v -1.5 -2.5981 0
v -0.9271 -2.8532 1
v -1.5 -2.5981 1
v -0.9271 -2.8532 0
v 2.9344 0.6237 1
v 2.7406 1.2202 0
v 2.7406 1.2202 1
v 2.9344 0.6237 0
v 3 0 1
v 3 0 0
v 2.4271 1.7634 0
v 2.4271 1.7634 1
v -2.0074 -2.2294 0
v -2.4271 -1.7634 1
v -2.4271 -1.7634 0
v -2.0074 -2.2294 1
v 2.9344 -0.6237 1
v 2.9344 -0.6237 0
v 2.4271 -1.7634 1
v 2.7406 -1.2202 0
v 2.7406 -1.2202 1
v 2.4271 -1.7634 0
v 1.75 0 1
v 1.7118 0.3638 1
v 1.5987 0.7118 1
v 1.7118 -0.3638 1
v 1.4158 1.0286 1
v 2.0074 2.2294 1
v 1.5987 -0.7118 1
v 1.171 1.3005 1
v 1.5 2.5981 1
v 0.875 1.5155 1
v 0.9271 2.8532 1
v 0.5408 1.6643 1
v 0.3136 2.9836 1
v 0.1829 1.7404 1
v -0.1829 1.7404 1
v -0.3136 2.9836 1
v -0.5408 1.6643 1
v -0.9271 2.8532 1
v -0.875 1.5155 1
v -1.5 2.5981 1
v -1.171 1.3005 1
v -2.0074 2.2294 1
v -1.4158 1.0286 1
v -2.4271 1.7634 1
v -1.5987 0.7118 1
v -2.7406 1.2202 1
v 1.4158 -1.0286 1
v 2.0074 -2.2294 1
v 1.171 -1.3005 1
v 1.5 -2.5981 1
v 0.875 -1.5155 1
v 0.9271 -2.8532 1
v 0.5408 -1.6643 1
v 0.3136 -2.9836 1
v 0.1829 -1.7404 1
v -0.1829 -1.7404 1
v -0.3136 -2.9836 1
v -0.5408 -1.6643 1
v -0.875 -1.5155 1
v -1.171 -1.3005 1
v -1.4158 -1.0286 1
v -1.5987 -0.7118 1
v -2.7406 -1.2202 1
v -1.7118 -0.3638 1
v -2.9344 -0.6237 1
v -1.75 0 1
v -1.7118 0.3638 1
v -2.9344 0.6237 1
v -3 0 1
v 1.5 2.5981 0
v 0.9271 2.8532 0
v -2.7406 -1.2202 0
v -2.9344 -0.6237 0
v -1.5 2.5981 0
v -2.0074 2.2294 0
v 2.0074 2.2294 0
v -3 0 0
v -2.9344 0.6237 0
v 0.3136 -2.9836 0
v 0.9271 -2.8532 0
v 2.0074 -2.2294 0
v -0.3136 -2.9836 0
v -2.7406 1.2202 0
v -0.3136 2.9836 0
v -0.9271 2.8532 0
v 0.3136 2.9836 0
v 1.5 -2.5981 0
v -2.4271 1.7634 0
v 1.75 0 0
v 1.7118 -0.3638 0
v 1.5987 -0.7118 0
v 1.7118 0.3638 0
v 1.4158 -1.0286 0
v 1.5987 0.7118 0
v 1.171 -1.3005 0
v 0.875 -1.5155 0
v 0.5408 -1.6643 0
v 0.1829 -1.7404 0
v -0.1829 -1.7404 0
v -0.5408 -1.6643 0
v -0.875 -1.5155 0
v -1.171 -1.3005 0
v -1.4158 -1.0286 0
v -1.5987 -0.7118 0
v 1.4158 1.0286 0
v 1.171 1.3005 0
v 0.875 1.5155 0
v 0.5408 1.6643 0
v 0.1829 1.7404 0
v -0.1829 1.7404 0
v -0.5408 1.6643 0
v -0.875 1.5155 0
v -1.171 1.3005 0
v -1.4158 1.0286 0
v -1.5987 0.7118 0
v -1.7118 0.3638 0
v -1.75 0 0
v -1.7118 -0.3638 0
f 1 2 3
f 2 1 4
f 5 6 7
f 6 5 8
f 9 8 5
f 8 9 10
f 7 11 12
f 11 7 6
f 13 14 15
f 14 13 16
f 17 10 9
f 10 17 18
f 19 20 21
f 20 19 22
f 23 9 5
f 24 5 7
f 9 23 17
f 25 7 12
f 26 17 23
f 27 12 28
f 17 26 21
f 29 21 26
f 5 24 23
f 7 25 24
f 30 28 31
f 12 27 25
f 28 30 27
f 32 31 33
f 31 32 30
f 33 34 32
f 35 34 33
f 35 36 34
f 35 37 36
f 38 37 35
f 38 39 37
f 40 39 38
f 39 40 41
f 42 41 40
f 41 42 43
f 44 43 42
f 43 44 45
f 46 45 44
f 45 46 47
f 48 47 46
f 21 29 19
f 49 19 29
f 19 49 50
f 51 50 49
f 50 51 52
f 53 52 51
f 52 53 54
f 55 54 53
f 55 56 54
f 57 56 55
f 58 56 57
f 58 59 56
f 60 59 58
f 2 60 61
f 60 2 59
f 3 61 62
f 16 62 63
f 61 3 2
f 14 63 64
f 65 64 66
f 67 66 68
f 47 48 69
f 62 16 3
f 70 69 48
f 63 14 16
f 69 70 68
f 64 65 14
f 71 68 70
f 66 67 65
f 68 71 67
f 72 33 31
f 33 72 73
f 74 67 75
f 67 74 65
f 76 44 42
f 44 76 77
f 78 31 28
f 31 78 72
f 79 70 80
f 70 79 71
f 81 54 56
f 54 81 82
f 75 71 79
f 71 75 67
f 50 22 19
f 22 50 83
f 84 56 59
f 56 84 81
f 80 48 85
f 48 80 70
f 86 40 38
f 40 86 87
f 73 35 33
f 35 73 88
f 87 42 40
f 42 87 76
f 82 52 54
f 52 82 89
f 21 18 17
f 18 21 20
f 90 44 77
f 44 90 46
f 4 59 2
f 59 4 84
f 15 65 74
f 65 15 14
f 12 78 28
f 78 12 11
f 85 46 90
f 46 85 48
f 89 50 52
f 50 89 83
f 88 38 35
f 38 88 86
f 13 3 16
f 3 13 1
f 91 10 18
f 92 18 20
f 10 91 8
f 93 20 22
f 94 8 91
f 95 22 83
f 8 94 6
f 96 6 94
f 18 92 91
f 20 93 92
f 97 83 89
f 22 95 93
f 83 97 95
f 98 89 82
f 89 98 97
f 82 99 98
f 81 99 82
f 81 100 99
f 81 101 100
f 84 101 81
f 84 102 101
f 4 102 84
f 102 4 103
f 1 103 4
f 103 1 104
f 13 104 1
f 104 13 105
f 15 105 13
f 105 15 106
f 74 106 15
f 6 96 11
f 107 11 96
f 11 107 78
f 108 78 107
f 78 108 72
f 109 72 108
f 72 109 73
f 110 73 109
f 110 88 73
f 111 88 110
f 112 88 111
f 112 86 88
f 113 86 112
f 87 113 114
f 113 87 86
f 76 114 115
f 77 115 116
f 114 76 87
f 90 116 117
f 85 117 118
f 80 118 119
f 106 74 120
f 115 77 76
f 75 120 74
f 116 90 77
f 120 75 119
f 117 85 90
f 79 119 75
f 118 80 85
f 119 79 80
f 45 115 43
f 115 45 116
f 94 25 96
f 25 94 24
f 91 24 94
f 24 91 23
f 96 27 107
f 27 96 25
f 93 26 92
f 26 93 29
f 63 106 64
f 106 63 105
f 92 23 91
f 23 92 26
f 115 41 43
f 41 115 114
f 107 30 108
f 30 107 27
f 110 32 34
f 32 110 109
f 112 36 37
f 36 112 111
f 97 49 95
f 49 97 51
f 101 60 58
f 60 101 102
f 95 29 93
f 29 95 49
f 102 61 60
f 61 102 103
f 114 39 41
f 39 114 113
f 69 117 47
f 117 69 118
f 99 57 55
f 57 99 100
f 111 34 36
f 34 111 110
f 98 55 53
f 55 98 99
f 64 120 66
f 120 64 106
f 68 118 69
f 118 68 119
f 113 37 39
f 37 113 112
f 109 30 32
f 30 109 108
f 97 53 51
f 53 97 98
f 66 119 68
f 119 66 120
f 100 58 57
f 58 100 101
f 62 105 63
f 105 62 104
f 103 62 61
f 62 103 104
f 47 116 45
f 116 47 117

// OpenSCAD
difference() {
	height=1;
	hole_r=1.75;
	$fs=0.1;
	cylinder(h=height, r=3);
	cylinder(h=height, r=hole_r);
}
